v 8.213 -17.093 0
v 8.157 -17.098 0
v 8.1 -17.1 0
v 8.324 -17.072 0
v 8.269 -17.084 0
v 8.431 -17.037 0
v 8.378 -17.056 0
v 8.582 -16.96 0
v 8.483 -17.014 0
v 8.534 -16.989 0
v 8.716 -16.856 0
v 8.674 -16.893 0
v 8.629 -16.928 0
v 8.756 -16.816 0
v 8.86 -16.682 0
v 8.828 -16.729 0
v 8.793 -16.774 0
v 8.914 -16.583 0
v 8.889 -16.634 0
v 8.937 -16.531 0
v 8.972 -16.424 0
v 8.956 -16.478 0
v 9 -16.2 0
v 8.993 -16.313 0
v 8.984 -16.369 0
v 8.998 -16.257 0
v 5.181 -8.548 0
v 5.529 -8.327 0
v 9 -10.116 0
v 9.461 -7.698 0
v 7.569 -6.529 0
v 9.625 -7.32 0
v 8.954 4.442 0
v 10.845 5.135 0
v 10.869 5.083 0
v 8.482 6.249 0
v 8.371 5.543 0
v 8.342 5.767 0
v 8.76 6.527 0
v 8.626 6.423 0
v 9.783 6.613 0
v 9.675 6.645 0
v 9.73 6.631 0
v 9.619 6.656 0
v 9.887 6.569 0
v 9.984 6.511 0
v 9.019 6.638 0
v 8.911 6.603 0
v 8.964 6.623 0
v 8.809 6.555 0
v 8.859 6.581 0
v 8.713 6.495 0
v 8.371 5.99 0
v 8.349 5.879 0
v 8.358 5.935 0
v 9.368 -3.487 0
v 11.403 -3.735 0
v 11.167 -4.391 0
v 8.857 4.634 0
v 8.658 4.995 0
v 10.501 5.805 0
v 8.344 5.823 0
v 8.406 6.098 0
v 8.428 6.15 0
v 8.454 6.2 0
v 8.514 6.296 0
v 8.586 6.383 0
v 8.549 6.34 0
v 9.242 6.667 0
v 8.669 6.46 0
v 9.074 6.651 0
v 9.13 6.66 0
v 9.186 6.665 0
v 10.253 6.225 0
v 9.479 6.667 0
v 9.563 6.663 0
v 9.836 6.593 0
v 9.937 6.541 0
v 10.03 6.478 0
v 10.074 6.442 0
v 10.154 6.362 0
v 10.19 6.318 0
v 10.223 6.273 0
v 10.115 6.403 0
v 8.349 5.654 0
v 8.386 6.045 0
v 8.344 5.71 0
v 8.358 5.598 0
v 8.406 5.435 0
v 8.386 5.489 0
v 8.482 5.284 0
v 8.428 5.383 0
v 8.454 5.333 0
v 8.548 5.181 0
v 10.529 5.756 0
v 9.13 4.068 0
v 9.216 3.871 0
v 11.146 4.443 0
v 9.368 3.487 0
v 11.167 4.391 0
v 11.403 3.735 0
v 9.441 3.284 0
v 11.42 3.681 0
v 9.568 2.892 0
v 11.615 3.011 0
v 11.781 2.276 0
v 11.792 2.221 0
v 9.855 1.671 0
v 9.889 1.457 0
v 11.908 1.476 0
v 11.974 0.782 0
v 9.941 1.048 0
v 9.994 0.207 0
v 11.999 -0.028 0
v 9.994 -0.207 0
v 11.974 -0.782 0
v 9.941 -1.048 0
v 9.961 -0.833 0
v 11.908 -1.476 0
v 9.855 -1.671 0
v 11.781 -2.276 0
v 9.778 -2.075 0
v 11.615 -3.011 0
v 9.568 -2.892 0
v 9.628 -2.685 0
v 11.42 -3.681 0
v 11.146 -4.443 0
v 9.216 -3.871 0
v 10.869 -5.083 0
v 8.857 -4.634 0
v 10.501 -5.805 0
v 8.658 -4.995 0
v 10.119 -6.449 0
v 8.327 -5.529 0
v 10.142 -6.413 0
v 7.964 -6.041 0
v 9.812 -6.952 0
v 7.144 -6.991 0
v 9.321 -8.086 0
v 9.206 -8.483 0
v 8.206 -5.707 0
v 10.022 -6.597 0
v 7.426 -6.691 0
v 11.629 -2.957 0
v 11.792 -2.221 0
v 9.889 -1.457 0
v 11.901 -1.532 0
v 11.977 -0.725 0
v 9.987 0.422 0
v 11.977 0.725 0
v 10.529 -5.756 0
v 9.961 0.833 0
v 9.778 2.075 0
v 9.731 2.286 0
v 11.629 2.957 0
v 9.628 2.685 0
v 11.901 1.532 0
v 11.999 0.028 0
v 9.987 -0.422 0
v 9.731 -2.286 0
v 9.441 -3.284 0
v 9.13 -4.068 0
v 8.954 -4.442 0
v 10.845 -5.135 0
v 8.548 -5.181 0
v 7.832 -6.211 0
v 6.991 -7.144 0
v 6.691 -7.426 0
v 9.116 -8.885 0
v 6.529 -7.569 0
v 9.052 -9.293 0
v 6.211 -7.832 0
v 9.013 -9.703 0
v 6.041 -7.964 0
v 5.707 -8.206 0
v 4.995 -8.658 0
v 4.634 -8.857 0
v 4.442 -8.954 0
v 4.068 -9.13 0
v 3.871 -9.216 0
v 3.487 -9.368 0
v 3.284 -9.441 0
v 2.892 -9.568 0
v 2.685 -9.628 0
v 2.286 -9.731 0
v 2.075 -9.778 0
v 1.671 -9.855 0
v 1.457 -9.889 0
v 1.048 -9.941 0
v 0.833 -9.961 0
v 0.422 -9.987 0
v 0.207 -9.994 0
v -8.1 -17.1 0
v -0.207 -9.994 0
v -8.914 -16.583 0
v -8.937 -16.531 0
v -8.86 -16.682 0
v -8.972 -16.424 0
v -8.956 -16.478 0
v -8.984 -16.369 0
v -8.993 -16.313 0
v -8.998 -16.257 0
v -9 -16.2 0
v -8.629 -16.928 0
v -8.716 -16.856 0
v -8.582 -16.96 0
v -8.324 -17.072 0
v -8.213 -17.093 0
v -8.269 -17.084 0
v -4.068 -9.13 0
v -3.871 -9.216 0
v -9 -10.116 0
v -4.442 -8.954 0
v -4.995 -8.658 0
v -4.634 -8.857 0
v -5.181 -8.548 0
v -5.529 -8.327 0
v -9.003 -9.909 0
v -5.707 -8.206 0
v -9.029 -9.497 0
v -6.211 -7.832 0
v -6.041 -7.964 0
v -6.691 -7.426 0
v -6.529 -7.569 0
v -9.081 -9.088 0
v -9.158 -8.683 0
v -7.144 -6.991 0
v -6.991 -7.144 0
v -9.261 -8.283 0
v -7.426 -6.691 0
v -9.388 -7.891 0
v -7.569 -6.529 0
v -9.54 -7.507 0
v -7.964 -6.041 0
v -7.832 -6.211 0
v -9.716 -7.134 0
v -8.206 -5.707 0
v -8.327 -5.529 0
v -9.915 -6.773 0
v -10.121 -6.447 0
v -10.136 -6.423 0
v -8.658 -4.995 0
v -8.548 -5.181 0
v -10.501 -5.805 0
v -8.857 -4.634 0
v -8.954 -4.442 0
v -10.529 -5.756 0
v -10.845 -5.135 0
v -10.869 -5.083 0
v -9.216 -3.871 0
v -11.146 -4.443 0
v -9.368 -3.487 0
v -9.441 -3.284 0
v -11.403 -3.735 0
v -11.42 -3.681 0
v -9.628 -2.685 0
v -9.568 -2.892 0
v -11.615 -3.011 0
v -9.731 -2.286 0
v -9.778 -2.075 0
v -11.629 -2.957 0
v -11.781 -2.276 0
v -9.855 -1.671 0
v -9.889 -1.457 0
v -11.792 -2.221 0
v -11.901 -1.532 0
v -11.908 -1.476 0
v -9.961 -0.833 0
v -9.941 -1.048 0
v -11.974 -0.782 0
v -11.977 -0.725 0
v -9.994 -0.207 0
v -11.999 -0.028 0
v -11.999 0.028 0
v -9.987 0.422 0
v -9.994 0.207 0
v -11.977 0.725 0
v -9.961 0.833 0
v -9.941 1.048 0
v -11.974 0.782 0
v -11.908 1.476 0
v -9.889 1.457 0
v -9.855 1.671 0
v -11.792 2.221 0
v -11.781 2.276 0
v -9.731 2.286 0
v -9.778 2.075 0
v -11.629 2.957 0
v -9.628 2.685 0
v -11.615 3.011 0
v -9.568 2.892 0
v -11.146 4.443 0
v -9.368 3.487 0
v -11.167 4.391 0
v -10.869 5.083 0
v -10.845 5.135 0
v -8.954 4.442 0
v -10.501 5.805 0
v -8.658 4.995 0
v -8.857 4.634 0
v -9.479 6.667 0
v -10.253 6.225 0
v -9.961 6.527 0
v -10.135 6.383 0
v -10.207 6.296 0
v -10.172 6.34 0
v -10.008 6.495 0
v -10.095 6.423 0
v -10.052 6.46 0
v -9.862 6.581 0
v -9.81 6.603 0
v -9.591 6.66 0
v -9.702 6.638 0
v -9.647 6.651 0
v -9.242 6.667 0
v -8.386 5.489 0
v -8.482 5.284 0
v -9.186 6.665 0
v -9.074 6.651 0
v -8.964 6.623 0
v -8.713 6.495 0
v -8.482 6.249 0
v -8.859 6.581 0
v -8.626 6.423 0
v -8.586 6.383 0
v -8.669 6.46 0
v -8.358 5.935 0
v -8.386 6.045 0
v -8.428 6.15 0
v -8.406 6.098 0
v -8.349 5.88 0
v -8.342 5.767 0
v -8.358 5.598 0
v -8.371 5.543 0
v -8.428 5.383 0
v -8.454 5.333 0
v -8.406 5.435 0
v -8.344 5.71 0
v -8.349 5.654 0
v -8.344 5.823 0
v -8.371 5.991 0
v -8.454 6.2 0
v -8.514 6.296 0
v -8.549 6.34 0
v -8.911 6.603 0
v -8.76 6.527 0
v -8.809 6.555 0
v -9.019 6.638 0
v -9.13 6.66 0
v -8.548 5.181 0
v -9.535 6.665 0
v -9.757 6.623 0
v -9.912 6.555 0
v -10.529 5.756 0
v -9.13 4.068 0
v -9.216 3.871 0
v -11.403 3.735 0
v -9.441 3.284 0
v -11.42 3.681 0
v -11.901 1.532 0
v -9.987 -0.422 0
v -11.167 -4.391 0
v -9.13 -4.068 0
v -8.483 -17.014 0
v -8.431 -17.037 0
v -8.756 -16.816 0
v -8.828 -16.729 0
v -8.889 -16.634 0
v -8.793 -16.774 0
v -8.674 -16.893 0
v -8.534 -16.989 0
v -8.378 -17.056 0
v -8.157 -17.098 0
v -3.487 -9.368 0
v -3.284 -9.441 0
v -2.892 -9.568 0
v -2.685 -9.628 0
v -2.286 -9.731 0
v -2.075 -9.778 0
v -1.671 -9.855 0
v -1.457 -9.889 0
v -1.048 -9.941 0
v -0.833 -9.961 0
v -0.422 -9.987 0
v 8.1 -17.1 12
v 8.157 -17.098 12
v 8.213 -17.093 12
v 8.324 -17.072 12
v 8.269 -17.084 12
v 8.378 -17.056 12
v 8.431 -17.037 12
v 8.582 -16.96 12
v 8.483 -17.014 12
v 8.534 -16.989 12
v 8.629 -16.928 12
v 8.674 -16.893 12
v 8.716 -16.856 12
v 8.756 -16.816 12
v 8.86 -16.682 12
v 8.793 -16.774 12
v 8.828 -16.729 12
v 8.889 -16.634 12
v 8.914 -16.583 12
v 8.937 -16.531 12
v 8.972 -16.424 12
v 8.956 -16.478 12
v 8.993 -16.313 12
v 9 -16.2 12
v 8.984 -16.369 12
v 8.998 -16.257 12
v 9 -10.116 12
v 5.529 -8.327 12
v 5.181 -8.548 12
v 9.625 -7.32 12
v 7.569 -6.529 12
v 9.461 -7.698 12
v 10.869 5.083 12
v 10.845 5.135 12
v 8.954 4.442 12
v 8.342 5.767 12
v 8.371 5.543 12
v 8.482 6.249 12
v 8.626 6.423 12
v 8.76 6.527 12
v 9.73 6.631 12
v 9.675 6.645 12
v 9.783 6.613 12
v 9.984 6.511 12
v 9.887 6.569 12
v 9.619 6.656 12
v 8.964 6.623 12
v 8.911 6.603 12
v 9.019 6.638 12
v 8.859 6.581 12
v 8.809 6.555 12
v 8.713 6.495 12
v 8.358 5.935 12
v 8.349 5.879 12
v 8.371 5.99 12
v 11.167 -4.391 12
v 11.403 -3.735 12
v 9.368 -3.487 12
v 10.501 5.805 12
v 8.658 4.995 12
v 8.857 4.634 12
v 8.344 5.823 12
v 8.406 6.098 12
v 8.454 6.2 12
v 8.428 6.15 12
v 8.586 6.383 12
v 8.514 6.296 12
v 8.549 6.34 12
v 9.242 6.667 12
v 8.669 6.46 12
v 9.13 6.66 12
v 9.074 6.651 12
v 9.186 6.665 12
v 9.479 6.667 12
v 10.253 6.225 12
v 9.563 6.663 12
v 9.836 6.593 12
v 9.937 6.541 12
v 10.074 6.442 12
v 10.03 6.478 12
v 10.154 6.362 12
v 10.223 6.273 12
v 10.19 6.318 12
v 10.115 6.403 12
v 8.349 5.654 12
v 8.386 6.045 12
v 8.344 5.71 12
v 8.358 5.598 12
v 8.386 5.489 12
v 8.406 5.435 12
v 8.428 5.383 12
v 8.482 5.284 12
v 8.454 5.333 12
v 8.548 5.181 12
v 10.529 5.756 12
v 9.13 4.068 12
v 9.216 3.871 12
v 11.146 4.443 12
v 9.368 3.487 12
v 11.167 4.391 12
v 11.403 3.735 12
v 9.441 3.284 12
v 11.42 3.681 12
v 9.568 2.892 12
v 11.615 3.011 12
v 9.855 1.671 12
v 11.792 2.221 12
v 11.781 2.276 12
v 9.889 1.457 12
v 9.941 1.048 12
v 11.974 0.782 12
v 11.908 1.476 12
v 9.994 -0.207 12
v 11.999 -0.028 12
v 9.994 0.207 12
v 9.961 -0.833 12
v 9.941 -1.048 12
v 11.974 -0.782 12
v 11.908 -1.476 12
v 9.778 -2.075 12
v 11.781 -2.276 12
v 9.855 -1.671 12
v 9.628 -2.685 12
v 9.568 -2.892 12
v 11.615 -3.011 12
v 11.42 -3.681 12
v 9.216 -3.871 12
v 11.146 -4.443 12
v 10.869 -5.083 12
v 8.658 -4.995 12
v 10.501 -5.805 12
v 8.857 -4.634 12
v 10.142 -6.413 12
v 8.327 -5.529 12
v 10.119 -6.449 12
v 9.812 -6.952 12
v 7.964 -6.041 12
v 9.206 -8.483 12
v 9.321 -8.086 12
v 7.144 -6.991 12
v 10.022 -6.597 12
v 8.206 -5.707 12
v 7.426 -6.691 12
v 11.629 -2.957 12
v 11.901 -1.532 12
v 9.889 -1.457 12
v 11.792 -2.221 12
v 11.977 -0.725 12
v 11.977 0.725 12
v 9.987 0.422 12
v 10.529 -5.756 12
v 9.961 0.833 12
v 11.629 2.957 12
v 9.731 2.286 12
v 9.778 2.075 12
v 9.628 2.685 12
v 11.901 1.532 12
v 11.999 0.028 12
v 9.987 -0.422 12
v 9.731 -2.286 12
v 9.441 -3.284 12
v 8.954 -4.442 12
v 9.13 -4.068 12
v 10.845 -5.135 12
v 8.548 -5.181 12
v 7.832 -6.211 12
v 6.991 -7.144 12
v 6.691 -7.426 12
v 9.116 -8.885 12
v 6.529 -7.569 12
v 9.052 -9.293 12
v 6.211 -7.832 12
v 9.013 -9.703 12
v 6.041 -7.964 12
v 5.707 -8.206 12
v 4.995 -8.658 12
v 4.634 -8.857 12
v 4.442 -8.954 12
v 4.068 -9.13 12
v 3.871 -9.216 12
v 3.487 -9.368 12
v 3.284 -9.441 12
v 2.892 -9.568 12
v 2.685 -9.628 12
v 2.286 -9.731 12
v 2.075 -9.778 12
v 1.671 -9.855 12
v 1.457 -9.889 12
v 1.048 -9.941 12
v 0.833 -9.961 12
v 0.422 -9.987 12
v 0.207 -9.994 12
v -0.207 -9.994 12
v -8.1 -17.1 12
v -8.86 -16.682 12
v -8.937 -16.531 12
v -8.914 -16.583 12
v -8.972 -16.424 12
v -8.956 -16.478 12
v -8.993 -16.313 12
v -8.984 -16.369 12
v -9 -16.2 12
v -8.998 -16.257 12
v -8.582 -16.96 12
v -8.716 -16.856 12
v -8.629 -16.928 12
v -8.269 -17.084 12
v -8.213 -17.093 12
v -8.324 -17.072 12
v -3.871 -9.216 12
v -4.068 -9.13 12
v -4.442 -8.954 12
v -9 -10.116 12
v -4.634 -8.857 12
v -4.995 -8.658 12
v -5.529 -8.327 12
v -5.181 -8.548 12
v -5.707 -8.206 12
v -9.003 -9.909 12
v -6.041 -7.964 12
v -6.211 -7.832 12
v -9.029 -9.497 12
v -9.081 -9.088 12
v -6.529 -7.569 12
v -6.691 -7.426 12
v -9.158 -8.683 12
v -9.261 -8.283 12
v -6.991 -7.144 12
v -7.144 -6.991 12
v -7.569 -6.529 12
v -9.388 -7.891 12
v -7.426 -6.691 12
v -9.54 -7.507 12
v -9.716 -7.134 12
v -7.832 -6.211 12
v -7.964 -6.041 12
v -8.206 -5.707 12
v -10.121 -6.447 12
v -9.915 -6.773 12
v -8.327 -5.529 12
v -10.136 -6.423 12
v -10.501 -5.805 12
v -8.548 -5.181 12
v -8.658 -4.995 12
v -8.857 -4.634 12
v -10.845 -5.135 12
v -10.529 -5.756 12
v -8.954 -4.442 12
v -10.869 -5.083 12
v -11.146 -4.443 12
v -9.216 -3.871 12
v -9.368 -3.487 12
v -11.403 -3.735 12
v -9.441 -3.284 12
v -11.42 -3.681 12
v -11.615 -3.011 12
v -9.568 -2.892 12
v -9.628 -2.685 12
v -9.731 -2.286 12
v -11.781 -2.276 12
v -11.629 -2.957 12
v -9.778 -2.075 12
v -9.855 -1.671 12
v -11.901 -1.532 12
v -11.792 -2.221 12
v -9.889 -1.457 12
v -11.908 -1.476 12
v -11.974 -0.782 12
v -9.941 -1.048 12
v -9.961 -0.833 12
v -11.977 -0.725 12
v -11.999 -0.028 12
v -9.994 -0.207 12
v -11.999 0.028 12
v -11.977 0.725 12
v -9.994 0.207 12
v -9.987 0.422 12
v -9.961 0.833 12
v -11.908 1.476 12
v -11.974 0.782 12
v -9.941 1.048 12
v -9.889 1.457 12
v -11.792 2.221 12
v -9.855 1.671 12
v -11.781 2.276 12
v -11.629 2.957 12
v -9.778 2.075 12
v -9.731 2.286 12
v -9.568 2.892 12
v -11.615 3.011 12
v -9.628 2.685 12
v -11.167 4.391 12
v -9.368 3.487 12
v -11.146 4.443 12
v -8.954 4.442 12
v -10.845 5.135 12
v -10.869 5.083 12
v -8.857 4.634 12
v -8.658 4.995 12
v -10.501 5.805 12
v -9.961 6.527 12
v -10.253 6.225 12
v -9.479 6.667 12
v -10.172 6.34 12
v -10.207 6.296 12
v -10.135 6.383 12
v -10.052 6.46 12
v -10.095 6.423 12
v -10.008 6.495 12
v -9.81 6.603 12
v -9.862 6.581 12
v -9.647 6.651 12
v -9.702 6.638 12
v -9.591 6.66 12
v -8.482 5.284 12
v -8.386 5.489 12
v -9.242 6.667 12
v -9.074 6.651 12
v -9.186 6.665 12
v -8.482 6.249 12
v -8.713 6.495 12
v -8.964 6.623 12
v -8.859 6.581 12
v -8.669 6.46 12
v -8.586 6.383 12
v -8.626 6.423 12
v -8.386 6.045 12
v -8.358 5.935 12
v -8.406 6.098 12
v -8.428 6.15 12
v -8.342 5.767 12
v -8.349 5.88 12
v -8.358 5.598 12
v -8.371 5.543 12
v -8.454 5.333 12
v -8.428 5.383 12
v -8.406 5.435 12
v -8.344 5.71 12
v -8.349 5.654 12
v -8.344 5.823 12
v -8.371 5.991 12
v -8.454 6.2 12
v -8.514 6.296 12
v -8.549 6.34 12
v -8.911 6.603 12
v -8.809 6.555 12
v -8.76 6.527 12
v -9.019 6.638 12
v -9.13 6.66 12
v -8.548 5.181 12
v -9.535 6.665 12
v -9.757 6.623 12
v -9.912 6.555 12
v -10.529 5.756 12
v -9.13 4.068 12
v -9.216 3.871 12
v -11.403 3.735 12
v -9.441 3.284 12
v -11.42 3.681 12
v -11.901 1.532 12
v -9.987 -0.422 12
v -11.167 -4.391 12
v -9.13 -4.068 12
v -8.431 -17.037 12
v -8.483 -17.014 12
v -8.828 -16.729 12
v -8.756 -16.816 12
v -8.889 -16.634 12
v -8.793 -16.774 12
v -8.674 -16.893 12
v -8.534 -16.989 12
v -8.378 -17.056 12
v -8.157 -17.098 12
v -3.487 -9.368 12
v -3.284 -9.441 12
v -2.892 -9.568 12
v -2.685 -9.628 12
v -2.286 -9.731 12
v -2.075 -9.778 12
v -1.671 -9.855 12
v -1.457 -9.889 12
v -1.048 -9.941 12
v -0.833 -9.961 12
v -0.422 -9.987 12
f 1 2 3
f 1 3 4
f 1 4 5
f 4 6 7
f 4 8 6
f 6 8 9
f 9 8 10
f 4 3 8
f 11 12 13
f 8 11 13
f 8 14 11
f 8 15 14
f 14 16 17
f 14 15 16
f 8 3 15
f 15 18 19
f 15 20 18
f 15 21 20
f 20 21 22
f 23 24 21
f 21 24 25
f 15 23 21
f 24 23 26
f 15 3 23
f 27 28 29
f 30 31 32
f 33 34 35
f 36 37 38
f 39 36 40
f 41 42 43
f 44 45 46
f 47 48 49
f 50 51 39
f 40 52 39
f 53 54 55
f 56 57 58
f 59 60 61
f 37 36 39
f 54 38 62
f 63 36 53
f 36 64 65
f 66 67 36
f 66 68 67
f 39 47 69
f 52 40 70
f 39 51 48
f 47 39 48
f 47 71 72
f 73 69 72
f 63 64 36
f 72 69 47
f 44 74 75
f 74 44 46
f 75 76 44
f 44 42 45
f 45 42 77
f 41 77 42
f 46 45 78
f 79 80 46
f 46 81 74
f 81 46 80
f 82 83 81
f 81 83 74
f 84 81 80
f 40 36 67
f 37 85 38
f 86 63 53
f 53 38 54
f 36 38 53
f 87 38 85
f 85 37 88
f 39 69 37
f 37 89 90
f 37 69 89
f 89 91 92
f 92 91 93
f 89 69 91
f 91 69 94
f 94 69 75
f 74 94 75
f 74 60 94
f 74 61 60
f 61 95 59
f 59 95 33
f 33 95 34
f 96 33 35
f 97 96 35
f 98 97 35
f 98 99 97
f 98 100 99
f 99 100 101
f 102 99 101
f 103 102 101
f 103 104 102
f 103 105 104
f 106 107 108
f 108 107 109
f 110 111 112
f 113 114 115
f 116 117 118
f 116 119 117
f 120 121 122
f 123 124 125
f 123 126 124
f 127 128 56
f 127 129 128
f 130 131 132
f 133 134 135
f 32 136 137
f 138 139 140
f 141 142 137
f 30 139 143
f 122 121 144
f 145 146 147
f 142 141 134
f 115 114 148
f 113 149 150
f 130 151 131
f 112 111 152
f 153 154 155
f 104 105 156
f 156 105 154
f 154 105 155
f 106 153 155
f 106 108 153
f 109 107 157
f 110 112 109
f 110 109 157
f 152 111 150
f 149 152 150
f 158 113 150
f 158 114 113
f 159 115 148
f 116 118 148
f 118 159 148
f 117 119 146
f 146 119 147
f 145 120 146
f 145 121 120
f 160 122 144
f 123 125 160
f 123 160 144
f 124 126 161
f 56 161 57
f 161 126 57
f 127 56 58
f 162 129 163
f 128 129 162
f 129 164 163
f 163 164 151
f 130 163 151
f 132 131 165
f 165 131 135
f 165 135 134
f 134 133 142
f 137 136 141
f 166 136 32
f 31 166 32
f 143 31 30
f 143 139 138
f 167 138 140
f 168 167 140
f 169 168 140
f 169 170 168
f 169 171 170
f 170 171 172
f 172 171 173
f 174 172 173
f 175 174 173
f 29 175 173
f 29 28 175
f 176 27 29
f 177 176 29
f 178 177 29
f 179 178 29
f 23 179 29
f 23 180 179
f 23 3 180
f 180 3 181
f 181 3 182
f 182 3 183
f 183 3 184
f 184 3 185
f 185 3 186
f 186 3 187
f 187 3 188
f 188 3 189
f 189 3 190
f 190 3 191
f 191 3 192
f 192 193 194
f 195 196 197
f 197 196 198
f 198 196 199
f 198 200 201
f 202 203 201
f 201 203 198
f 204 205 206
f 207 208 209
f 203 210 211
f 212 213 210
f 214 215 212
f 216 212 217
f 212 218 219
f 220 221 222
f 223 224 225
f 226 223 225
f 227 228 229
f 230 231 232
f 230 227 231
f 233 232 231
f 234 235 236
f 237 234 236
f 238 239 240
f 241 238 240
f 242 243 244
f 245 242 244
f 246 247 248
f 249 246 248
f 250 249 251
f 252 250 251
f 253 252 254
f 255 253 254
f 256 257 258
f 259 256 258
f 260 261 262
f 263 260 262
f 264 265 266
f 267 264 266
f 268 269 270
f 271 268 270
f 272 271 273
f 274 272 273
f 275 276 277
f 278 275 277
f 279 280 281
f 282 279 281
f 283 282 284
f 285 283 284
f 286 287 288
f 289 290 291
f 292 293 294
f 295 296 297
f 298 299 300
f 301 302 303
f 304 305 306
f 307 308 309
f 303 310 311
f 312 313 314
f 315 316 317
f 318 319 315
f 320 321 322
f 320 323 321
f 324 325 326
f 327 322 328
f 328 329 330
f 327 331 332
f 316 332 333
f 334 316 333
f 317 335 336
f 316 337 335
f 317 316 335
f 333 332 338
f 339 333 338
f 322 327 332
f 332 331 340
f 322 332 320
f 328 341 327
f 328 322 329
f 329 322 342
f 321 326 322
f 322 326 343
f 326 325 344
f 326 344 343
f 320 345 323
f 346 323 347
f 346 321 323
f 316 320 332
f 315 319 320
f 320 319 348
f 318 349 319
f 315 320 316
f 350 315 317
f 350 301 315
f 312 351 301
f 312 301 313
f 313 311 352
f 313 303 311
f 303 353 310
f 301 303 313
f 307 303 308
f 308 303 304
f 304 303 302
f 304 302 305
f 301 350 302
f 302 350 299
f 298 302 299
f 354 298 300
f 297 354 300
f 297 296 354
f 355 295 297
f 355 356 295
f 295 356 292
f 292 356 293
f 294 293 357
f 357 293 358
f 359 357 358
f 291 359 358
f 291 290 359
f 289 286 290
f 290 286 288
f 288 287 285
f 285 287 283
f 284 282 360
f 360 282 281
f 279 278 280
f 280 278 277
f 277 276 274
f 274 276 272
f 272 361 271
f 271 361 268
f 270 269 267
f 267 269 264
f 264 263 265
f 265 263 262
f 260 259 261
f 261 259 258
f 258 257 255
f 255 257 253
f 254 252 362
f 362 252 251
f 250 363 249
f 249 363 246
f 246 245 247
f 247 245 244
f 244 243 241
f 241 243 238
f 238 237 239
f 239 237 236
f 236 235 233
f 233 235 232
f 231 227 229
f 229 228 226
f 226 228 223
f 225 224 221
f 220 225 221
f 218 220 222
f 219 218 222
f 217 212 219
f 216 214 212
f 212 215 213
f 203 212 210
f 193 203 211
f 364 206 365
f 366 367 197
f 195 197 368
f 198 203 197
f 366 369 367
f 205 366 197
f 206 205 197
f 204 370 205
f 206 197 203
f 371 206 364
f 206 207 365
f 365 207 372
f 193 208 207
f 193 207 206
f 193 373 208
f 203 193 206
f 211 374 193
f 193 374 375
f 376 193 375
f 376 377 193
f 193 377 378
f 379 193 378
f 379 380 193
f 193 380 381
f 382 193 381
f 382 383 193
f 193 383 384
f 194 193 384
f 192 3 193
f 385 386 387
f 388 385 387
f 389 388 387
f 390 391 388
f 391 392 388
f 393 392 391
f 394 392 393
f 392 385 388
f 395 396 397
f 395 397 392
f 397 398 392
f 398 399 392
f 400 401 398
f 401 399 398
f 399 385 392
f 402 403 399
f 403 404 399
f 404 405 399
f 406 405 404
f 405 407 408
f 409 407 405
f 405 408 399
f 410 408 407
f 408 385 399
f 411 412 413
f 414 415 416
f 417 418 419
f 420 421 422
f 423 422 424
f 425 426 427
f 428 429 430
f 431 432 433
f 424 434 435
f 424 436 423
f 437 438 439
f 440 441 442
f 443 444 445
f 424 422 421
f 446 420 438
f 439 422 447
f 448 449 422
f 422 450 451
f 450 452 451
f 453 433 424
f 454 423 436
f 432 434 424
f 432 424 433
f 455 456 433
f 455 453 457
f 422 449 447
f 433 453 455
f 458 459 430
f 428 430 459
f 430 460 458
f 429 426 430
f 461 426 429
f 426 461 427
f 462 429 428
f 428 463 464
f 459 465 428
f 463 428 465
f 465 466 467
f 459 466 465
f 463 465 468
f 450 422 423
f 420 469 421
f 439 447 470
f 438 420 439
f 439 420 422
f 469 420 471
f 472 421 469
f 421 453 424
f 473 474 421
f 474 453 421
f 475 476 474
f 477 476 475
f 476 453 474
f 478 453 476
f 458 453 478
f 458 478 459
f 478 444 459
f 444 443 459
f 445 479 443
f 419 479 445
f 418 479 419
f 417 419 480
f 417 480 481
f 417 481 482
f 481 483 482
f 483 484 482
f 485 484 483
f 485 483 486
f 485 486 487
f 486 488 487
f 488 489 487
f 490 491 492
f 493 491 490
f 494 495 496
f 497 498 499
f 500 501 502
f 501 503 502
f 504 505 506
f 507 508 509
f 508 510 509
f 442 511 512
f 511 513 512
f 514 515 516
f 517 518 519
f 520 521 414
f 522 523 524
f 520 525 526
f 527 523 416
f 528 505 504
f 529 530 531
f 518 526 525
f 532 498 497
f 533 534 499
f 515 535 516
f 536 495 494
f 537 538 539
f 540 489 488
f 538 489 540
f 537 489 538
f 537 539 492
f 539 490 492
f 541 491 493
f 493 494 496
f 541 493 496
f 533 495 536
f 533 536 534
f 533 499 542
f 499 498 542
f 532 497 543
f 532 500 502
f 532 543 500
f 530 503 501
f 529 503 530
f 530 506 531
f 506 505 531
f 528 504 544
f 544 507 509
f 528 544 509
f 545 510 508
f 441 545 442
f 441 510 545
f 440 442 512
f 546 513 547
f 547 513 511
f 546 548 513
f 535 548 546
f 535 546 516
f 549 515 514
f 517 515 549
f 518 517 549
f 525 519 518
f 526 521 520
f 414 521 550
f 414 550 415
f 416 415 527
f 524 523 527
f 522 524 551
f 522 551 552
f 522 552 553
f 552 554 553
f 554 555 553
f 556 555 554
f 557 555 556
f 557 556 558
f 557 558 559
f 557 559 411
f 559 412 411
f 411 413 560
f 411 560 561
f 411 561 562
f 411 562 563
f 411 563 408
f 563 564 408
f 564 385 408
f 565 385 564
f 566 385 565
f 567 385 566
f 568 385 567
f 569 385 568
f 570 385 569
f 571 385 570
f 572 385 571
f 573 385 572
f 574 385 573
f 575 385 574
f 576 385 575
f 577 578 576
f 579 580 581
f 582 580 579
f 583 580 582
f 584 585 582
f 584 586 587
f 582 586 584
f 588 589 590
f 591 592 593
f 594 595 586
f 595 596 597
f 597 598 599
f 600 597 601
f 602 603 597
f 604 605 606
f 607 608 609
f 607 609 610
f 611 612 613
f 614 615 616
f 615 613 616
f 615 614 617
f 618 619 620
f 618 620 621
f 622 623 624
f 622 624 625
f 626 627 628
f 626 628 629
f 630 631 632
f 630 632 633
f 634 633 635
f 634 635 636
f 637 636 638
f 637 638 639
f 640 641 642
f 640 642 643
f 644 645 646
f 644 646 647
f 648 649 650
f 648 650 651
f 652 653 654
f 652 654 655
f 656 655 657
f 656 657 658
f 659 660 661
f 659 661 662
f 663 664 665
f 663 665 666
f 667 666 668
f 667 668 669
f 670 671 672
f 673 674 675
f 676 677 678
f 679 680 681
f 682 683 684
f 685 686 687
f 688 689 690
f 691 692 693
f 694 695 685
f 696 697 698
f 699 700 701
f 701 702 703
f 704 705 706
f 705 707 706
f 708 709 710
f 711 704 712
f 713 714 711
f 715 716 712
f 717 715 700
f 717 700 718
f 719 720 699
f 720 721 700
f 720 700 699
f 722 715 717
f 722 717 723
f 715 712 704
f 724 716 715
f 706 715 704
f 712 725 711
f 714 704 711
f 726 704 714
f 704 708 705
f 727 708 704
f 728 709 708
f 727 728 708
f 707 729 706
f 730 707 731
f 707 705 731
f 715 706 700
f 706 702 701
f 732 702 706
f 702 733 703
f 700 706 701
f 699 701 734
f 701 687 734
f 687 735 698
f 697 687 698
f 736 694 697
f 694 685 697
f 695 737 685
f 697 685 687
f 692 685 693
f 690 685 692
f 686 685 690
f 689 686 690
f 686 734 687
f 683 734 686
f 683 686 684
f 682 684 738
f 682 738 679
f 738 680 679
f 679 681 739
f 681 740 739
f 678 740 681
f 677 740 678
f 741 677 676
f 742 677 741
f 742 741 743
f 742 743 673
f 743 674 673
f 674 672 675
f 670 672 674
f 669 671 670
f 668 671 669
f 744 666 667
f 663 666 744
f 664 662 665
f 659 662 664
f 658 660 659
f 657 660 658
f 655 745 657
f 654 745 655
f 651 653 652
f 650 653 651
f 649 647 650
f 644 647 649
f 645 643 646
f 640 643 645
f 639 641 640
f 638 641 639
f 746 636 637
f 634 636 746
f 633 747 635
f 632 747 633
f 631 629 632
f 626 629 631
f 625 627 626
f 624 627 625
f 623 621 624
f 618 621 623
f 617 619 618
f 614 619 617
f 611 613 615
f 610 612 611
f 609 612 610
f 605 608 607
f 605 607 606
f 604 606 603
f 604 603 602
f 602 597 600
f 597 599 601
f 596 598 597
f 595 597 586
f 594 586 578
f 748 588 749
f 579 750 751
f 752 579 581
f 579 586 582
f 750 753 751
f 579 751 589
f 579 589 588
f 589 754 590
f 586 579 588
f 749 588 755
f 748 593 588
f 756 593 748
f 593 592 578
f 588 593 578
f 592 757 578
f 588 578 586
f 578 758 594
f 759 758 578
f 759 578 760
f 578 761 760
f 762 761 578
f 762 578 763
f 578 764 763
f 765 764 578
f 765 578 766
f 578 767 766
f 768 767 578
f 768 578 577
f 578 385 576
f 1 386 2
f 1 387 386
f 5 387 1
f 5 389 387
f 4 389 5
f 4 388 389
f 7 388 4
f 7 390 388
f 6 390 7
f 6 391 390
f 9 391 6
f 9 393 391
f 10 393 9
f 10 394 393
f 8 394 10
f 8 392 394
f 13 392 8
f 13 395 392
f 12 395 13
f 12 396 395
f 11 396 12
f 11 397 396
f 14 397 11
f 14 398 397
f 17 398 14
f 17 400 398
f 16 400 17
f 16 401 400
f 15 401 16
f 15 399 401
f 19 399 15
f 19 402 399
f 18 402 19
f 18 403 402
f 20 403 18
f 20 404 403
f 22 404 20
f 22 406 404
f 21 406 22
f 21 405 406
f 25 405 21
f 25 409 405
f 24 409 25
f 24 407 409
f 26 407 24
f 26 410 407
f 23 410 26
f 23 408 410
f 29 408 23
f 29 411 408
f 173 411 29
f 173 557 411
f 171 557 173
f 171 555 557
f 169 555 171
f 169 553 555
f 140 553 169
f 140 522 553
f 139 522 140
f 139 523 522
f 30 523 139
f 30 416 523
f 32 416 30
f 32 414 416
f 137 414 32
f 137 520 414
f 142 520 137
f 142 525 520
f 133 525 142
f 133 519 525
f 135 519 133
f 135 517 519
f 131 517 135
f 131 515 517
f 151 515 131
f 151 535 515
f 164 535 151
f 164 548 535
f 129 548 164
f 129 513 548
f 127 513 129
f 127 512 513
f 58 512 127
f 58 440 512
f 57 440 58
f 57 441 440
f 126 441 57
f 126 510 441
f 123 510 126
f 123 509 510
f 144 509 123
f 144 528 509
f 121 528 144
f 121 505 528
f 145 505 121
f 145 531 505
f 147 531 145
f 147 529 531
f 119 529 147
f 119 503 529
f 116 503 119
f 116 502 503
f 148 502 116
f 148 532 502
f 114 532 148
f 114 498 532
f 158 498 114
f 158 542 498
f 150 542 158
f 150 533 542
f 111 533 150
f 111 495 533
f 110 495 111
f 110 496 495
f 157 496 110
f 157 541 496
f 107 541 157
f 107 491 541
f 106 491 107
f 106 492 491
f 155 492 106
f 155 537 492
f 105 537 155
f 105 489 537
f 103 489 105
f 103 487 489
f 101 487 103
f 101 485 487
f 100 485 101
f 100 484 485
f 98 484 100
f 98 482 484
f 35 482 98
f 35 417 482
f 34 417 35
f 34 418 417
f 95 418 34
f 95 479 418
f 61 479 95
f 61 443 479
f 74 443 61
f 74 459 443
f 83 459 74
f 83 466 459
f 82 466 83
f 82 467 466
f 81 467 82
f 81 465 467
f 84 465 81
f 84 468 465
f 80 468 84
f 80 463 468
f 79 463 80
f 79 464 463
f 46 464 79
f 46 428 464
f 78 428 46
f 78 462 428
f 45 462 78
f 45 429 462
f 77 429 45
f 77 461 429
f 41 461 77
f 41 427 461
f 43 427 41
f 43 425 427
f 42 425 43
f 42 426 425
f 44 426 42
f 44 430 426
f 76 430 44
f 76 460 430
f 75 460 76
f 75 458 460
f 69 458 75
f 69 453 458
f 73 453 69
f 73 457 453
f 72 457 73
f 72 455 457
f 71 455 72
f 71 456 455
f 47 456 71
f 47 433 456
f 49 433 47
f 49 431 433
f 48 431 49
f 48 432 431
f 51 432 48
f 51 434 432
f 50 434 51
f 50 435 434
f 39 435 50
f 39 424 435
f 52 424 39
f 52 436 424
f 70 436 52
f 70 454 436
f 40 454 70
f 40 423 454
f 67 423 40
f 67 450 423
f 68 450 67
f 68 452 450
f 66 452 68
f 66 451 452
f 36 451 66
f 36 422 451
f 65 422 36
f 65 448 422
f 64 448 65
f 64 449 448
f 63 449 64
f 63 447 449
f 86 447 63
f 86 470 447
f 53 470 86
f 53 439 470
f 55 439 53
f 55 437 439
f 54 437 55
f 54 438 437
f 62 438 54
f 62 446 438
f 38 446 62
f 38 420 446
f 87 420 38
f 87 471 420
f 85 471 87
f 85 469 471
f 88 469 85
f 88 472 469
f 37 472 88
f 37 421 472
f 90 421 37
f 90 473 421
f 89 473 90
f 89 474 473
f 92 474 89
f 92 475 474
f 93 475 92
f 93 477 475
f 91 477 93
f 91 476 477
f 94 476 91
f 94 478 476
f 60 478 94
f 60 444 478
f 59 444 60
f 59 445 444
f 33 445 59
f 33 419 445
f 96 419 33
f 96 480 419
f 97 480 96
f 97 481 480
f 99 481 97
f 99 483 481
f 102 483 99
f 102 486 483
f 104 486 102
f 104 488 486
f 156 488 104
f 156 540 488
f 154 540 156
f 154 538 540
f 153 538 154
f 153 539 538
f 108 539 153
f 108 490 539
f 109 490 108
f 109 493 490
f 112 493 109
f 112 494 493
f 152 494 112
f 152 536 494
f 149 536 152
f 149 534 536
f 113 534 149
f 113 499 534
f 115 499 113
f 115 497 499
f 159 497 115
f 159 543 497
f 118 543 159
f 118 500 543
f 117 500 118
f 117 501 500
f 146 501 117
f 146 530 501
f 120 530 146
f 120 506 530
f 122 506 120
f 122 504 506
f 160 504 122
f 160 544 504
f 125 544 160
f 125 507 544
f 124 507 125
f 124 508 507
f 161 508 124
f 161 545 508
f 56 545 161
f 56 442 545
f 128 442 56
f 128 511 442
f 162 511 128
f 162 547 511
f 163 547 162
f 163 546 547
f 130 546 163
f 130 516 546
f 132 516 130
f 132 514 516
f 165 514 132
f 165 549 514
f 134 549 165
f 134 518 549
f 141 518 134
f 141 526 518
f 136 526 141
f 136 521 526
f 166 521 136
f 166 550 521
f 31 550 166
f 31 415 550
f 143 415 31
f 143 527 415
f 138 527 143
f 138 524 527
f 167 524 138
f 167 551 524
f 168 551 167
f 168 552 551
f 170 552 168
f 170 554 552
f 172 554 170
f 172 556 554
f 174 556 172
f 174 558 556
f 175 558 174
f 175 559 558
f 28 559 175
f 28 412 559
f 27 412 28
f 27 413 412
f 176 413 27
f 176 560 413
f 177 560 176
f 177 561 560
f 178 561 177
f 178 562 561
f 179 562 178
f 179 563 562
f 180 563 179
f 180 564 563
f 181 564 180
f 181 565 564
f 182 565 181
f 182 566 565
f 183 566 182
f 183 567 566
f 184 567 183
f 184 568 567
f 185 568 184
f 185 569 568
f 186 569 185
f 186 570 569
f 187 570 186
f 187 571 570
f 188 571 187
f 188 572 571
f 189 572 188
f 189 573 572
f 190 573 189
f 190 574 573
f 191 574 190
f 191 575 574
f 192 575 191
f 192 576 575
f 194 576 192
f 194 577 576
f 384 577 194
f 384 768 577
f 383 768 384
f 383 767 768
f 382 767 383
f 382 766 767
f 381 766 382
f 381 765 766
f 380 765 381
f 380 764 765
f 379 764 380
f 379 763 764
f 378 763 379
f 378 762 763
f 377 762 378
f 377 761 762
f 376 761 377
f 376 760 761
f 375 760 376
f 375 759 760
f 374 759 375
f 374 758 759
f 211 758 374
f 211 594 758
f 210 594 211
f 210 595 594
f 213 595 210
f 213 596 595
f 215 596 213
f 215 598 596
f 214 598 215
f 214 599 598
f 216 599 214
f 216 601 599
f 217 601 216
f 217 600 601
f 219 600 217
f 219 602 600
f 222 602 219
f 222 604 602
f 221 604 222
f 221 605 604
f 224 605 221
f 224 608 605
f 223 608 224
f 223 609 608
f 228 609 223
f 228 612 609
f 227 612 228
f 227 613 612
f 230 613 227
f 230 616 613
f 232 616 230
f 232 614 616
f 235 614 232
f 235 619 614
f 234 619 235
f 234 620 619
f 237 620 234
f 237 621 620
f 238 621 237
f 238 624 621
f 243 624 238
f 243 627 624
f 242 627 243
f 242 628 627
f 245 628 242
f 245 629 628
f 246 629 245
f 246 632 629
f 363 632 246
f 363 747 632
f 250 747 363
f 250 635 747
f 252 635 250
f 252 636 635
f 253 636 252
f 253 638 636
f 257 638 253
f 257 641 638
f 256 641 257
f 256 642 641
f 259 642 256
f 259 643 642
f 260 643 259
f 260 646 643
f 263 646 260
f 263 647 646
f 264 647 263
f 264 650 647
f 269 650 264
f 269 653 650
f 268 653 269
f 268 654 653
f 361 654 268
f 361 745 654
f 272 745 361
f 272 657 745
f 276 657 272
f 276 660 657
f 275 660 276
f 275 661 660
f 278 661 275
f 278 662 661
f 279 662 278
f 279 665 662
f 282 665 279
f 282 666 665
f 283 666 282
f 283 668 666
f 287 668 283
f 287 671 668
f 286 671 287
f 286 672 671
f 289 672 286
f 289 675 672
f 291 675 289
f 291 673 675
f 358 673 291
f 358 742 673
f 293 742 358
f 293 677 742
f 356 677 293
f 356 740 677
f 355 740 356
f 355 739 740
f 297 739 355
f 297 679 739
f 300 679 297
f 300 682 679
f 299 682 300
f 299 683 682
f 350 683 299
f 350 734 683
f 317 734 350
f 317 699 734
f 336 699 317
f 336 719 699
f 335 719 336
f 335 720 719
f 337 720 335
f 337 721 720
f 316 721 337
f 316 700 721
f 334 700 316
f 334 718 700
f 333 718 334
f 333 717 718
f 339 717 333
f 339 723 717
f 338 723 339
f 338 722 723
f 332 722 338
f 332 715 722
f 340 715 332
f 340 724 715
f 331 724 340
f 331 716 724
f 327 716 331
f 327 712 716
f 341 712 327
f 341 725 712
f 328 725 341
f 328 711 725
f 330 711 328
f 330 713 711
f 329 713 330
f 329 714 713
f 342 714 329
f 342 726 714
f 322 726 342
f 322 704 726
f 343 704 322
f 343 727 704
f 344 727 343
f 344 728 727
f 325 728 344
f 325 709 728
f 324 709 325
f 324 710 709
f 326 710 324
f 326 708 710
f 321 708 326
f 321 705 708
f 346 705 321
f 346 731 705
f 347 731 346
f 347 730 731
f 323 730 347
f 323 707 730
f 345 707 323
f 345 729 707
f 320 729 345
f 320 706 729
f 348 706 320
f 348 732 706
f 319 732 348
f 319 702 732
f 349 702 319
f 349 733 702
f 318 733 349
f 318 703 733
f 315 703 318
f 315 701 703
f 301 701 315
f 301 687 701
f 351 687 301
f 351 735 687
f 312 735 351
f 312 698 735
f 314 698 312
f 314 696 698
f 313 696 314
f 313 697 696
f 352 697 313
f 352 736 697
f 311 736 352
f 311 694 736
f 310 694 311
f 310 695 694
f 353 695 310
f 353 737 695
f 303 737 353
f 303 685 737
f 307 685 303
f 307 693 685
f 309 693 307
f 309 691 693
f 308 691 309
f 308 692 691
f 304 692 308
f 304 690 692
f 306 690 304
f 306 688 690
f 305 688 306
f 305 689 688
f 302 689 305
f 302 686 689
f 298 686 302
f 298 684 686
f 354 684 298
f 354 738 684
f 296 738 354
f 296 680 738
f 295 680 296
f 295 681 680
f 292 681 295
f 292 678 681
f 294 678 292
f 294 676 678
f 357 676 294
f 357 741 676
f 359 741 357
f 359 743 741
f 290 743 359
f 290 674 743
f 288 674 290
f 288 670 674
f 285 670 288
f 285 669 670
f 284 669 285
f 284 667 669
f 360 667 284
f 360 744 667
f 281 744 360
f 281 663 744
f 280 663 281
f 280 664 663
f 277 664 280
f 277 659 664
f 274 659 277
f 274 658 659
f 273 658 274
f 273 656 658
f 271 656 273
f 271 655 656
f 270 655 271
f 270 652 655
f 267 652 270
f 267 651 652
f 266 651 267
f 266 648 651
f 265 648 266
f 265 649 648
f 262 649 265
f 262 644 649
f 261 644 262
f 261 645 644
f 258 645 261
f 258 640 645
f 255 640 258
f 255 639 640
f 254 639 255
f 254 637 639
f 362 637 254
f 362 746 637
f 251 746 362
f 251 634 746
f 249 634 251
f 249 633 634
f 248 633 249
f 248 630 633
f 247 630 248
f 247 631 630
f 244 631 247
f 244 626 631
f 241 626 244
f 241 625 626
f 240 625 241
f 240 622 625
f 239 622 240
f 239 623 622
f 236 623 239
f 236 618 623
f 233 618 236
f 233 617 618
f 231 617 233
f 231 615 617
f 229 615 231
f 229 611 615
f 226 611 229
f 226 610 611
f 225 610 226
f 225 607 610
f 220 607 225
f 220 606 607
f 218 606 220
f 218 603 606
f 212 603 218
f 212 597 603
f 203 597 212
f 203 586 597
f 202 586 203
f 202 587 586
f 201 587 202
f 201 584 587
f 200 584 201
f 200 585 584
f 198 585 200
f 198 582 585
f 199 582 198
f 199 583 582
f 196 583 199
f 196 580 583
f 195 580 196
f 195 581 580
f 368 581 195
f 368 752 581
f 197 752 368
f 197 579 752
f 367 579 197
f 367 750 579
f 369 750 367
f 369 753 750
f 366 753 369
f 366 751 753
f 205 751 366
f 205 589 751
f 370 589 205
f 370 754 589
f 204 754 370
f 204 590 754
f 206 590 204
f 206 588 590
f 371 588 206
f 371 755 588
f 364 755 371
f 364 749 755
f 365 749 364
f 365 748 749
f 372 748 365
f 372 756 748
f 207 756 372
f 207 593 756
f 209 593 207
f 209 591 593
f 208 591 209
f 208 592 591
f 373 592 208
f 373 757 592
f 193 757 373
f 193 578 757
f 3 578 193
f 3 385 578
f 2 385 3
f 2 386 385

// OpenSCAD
///OpenSCAD version 2015.03-2/////////////////// 
////////////////////////////////////////////////
// OpenSCAD File V1.0 by Ken_Applications //////
/////          03 - 01 - 2018              /////
////////////////////////////////////////////////
////////////////////////////////////////////////

Diameter_to_grip=20;
Number_of_clips=1;
clip_height=12;
width_of_base=18;
depth_of_base=7;
clip_wall_thickness=2;
center_line_distance=36;


module contor1(){
 translate([0,-dist_from_cl,0]) square([width_of_base,depth_of_base],true);
 contor();
}


////calculations//////////////
the_fillet_r=(clip_wall_thickness/2)-0.1;
outer_dia=Diameter_to_grip+(2*clip_wall_thickness);
dist_from_cl=((Diameter_to_grip/2)+(depth_of_base/2))+0.1;
grip_offset=Diameter_to_grip/3;
blend_radius=(Diameter_to_grip/3)-0.1;
move_bit=(Diameter_to_grip/2)+depth_of_base;
//////////////////////////////


module clip_cyl(){
difference(){
cylinder(h=2, d1=outer_dia, d2=outer_dia, center=false,$fn=100);
translate([0,0,-1])cylinder(h=clip_height, d1=Diameter_to_grip, d2=Diameter_to_grip, center=false,$fn=100);
translate([-width_of_base,grip_offset,-1]) cube([width_of_base*2,width_of_base,2],false);
    }
}

module contor(){
projection(cut = true) 
clip_cyl();
}

module fillet(r) {
   offset(r = -r) {
     offset(delta = r) {
       contor1();
     }
   }
}

module fillet2(r) {
   offset(r = -r) {
     offset(delta = r) {
       clip();
     }
   }
}

module clip(){
fillet(blend_radius,false,$fn=100);
}

module clip_without_hole(){
linear_extrude(height=clip_height)
    fillet2(-the_fillet_r,false,$fn=100);
}


module finish(){
clip_without_hole();

for (x = [1:1:Number_of_clips-1] ){
translate([-x*center_line_distance,0,0]) clip_without_hole();
translate([-x*center_line_distance,-move_bit,0]) cube([x*center_line_distance,depth_of_base,clip_height],false);
}
}


finish();
